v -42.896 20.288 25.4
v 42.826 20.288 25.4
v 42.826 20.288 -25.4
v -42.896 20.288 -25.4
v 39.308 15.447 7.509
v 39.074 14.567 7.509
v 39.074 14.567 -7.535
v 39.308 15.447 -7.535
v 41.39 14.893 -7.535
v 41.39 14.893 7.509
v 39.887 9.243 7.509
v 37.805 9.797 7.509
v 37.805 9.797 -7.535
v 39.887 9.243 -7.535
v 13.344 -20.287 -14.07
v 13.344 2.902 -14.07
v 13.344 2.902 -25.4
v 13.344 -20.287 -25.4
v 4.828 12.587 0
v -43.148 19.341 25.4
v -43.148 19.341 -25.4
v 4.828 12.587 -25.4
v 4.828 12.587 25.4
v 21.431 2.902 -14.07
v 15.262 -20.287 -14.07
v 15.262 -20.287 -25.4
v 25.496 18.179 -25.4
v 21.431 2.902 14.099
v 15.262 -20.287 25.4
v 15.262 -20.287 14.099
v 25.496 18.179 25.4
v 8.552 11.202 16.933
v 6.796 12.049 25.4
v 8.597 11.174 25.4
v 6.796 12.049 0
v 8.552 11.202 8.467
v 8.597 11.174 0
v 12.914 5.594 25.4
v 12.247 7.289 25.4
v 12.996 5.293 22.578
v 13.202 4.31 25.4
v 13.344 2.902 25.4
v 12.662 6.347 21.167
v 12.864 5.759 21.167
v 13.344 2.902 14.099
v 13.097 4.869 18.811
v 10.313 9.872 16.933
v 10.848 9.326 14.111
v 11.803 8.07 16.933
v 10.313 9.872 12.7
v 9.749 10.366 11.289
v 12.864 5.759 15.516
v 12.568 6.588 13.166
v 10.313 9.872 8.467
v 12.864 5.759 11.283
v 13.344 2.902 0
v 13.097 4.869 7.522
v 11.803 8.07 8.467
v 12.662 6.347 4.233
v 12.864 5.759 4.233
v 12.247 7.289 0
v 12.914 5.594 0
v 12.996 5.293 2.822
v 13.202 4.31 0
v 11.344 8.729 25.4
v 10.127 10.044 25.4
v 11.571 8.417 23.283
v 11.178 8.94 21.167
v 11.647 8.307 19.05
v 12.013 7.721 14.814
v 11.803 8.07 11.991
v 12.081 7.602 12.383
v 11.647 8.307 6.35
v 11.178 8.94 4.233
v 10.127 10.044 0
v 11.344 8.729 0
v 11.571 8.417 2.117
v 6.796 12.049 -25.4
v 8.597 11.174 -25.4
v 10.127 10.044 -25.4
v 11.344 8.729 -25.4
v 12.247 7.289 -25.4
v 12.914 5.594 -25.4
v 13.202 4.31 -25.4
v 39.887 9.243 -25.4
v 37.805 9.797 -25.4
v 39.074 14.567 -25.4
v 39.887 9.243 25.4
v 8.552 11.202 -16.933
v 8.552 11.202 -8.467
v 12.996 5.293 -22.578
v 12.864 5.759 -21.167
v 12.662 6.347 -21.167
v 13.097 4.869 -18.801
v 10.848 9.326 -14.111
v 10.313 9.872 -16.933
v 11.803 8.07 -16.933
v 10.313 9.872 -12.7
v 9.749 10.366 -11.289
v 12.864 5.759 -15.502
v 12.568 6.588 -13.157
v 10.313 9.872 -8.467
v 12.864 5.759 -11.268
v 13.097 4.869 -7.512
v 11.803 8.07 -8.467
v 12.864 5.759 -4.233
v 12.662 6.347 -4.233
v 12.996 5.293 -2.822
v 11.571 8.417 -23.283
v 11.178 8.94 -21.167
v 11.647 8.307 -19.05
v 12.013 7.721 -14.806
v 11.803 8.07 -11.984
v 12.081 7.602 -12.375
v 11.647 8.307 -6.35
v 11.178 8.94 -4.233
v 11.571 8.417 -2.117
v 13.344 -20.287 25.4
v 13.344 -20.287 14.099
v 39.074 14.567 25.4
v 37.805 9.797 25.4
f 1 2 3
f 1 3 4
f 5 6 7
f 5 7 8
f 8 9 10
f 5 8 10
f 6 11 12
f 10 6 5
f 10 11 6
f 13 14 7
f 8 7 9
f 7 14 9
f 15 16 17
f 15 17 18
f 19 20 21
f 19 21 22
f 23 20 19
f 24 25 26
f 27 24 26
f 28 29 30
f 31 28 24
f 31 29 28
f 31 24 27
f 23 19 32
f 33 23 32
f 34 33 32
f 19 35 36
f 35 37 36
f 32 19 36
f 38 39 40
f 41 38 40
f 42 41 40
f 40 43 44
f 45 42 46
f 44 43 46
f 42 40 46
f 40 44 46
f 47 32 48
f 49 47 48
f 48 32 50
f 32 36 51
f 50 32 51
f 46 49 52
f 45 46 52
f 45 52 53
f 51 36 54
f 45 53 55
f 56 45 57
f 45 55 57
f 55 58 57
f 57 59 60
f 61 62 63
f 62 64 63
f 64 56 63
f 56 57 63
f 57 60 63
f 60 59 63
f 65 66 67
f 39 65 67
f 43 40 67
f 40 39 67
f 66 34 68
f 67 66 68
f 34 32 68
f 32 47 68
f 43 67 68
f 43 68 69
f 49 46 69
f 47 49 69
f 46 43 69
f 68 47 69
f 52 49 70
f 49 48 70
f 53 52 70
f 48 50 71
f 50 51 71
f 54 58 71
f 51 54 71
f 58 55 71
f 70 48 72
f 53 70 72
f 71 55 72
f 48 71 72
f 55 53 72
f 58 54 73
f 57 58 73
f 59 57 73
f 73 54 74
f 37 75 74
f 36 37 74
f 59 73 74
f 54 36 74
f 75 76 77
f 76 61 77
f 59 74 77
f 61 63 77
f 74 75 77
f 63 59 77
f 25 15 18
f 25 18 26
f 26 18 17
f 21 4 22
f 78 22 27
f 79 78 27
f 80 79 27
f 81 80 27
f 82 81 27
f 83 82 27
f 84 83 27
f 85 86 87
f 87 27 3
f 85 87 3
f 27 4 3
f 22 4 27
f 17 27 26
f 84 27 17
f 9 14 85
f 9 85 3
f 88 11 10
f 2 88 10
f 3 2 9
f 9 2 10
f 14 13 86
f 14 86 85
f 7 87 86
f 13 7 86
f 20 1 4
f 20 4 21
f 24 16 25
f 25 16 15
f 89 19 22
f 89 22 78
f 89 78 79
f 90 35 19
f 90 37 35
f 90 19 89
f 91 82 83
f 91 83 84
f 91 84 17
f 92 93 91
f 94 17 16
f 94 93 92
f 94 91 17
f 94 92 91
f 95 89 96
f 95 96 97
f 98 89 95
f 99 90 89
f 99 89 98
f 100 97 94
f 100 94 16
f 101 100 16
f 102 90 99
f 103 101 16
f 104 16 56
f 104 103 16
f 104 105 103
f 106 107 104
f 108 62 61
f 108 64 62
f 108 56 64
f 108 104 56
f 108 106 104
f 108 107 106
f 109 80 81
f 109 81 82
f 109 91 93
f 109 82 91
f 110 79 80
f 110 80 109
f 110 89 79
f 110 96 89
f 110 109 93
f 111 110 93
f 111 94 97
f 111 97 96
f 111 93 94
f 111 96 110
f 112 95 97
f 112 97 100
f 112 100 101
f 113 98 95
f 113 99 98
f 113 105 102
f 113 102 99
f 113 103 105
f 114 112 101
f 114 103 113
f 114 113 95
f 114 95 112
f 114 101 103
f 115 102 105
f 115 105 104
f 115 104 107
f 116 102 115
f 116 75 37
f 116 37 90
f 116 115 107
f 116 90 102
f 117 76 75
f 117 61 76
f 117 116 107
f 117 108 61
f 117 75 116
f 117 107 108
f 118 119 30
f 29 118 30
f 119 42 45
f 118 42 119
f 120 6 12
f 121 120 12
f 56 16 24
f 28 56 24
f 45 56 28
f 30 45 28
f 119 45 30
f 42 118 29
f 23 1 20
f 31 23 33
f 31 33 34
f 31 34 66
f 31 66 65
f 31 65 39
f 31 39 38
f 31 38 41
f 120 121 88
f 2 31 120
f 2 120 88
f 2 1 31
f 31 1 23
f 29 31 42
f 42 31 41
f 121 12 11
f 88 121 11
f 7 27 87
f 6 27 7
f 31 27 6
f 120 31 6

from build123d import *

# Parameters (mm, degrees)
F1_DEPTH      = 25.4
F1_DEPTH_BACK = 25.4
F2_W          = 5.8462059447
F2_H          = 15.0438407436
F3_DEPTH      = 2.1542214913
F4_W          = 23.189639207
F4_H          = 28.1684854999
F5_DEPTH      = 8.088287329


with BuildPart() as f1:
    # F0 (on Top) → F1 (new body, two sides)
    with BuildSketch(Plane.XY) as f1_sk:
        with BuildLine():
            Line((39.8870706558, 9.2431334779), (42.8255088627, 20.2876105905))
            Line((42.8255088627, 20.2876105905), (-42.8958497941, 20.2876105905))
            Line((-42.8958497941, 20.2876105905), (-43.1476103375, 19.3413379916))
            Line((-43.1476103375, 19.3413379916), (4.8284521326, 12.586873956))
            add(Edge.make_bspline(
                [(4.8284521326, 12.586873956), (8.3748446777, 11.9789214805), (13.0701588605, 9.1844080016), (13.3440204307, 2.9022279195)],
                knots=[0, 0, 0, 0, 12.8960176912, 12.8960176912, 12.8960176912, 12.8960176912], degree=3))
            Line((13.3440204307, 2.9022279195), (13.3440204307, -20.2874112874))
            Line((13.3440204307, -20.2874112874), (15.2615886182, -20.2874112874))
            Line((15.2615886182, -20.2874112874), (25.4958156311, 18.1791747184))
            Line((25.4958156311, 18.1791747184), (39.0742355021, 14.5665684056))
            Line((39.0742355021, 14.5665684056), (37.8052698946, 9.7970069509))
            Line((37.8052698946, 9.7970069509), (39.8870706558, 9.2431334779))
        make_face()
    extrude(amount=F1_DEPTH)
    extrude(f1_sk.sketch, amount=-F1_DEPTH_BACK)

    # F2 (on face) → F3 (cut, through all)
    with BuildSketch(Plane(origin=(34.9536834808, -9.2996017797, 0), x_dir=(0.2571107359, 0.966381948, 0), z_dir=(0.966381948, -0.2571107359, 0))):
        with Locations((22.1108943995, -0.0125817023)):
            Rectangle(F2_W, F2_H)
    extrude(amount=-F3_DEPTH, mode=Mode.SUBTRACT)

    # F4 (on face) → F5 (cut, through all)
    with BuildSketch(Plane(origin=(13.3440204307, 0, 0), x_dir=(0, -1, 0), z_dir=(-1, 0, 0))):
        with Locations((8.6925916839, 0.0144629739)):
            Rectangle(F4_W, F4_H)
    extrude(amount=-F5_DEPTH, mode=Mode.SUBTRACT)


solid = f1.part
